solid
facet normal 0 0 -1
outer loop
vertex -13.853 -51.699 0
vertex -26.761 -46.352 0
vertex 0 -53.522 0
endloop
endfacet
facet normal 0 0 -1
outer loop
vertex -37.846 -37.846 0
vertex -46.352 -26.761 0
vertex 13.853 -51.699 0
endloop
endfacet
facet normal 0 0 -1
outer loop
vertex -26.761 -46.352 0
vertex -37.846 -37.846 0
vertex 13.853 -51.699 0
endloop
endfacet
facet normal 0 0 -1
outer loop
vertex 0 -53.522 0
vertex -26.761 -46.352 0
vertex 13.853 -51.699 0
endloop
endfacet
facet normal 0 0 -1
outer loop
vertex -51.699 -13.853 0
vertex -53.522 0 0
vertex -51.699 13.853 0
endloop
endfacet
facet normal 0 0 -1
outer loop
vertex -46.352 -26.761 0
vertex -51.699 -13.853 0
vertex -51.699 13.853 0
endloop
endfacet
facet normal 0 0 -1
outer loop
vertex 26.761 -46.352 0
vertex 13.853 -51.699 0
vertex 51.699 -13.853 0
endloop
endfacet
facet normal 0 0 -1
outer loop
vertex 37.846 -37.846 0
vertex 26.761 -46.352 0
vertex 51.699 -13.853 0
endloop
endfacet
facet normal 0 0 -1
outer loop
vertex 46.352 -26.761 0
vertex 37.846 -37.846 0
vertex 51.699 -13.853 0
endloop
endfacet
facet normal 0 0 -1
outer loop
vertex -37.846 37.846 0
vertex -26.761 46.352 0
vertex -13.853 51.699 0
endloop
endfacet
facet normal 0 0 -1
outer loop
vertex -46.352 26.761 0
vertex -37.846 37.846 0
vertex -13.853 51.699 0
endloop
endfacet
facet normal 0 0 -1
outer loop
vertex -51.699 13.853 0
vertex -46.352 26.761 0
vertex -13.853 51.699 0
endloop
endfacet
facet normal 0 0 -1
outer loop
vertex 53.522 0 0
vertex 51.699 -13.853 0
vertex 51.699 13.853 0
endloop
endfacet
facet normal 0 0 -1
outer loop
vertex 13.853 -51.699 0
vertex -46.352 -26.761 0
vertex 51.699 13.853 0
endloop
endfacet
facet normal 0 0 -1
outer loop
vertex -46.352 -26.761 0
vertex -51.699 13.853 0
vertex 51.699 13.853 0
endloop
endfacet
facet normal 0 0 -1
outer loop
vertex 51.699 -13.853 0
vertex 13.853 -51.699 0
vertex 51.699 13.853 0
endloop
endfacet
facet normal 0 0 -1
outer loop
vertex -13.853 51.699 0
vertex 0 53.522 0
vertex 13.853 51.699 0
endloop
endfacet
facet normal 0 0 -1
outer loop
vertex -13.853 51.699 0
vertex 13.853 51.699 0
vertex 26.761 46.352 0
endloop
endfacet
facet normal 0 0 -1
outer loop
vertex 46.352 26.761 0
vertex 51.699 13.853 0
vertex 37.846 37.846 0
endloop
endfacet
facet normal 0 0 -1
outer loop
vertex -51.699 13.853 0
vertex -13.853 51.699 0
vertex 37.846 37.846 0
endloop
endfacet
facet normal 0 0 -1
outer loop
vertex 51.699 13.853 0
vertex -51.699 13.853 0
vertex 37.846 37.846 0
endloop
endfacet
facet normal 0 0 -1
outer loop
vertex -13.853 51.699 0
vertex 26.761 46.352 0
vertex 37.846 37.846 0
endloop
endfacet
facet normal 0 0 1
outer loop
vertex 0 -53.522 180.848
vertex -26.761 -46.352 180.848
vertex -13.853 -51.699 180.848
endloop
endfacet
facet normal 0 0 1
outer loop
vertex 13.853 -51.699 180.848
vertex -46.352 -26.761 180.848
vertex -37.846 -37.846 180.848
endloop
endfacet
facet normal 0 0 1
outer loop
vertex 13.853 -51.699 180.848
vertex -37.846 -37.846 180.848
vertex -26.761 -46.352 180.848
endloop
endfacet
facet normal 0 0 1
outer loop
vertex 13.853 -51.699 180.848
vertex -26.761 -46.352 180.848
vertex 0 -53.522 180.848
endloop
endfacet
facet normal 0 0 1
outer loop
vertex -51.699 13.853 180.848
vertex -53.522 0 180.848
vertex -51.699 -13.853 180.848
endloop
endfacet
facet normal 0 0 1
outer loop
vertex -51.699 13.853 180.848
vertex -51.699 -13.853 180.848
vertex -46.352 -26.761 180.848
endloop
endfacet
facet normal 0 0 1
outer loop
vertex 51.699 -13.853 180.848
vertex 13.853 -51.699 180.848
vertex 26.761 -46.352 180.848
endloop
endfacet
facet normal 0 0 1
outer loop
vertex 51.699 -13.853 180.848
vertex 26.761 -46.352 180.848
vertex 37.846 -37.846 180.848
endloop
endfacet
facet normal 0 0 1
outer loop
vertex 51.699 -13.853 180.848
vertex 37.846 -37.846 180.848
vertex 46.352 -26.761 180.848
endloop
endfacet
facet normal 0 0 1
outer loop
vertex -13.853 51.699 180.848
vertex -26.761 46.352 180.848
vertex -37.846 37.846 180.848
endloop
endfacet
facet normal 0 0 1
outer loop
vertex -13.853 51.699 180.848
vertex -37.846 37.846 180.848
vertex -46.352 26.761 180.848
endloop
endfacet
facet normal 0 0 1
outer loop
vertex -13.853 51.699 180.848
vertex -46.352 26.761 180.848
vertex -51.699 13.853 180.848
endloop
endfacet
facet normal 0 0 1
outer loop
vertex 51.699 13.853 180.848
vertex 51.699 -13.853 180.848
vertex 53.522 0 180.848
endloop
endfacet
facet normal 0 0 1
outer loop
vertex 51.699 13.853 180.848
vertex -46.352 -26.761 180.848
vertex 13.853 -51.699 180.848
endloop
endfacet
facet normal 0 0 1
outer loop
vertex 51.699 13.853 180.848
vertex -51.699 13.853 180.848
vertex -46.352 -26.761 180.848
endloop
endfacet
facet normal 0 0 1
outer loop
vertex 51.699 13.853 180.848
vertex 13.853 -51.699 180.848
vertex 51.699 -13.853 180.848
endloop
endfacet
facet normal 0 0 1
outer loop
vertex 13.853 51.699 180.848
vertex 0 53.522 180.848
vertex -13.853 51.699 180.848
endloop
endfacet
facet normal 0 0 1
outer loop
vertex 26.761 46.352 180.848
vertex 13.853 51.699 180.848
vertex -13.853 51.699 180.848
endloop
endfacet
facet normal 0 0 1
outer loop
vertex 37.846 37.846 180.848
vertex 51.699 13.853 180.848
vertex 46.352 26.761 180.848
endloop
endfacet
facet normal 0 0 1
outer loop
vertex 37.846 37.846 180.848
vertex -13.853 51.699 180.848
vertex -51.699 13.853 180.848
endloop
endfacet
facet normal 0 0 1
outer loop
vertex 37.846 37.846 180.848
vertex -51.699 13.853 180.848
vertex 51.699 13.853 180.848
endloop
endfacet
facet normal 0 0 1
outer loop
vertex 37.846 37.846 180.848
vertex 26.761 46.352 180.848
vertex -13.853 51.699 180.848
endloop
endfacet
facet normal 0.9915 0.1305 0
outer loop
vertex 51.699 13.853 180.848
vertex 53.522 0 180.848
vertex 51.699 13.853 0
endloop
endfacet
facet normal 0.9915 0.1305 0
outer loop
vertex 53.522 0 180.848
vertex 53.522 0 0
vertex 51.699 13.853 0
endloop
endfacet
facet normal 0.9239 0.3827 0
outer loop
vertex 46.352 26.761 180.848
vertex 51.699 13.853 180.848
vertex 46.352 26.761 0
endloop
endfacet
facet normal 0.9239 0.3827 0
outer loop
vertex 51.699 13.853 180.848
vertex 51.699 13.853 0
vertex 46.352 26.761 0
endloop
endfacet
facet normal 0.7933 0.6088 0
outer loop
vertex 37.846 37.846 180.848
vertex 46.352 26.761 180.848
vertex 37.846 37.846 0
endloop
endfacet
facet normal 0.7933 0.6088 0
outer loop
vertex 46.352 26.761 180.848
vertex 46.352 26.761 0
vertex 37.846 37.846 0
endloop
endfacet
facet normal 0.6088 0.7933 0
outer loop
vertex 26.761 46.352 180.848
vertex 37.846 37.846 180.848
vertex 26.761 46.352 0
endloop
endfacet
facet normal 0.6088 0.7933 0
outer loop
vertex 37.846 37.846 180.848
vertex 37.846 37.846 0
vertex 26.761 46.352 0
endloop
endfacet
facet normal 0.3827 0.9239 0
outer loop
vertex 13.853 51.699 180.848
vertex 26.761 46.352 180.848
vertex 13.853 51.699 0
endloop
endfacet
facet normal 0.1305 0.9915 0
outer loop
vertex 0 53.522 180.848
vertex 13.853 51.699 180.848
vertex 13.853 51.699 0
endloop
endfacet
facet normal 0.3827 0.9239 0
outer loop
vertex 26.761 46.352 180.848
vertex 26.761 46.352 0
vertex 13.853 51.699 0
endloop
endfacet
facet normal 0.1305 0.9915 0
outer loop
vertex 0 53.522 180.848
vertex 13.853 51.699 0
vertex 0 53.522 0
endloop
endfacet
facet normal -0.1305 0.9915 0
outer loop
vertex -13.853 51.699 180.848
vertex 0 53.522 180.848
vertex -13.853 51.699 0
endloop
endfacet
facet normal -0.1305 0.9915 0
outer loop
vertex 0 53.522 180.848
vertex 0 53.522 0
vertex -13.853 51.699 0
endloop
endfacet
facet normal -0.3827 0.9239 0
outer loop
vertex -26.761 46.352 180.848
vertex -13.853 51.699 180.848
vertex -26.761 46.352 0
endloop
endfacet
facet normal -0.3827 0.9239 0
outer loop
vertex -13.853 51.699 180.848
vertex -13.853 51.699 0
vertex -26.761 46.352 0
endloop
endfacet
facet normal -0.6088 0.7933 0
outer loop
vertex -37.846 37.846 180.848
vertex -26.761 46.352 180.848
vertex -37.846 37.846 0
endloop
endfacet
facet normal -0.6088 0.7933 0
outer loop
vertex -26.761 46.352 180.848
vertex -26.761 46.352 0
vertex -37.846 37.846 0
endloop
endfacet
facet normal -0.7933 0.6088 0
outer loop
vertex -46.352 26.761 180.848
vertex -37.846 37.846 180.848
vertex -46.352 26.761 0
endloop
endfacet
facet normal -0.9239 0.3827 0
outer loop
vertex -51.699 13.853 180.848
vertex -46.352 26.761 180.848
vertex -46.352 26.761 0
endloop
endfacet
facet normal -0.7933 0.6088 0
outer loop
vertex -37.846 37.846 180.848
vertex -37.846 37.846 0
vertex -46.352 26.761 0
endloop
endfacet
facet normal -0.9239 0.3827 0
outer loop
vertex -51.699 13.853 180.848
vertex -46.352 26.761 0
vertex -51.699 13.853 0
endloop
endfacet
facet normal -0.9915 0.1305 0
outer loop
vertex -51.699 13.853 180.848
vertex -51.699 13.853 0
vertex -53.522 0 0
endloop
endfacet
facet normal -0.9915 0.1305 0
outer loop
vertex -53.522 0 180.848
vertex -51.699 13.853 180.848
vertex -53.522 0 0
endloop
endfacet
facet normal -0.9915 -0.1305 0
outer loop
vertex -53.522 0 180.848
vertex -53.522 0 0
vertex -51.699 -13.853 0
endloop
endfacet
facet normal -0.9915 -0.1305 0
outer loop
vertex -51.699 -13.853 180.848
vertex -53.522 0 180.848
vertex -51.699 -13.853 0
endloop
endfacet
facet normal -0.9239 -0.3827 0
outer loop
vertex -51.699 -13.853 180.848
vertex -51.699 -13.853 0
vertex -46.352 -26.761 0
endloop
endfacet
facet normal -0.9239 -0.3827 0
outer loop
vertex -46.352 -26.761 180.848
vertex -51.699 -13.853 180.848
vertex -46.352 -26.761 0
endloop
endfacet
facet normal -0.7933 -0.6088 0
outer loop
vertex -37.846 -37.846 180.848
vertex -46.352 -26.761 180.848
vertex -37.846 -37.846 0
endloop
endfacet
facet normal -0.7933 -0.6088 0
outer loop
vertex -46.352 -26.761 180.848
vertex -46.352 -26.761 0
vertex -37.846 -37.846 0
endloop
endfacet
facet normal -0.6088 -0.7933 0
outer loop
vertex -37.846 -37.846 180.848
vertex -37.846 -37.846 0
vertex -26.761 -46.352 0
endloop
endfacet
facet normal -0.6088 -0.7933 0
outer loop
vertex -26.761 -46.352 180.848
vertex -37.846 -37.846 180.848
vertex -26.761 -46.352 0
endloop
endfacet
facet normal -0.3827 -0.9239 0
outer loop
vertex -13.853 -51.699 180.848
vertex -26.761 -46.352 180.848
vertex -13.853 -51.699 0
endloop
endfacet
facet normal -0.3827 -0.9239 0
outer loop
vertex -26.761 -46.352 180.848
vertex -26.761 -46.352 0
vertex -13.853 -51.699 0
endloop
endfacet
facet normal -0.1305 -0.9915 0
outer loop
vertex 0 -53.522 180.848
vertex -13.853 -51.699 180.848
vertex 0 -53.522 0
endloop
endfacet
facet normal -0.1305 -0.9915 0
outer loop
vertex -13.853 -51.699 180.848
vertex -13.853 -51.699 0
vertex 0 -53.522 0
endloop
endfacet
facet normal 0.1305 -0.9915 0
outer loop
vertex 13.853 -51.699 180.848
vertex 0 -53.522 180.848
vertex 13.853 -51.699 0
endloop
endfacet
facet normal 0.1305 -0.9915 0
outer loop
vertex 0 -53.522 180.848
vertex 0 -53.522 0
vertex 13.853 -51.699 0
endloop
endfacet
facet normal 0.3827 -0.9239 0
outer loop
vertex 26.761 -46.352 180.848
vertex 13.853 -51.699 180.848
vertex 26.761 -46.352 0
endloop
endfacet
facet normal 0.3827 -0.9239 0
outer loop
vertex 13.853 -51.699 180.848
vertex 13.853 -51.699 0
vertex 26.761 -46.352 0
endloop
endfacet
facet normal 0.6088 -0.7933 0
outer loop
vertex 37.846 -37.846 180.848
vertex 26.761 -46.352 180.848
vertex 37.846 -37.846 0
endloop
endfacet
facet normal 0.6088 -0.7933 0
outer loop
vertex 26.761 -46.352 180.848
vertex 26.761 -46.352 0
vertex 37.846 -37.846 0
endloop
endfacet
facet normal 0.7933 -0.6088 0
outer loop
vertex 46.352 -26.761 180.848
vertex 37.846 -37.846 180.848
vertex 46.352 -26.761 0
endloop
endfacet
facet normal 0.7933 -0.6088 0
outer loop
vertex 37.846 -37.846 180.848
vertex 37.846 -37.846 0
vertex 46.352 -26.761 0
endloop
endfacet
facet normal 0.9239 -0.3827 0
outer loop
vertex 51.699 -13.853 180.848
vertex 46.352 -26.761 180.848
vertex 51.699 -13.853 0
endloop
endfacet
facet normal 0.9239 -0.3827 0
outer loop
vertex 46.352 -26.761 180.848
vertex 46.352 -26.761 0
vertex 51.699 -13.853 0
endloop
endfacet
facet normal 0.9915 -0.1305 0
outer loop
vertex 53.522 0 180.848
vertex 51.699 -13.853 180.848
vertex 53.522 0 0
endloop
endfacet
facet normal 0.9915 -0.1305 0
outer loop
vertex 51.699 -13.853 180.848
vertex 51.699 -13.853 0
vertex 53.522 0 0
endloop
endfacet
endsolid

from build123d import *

# Parameters (mm, degrees)
F0_R     = 53.5223969486
F1_DEPTH = 113.03
F2_DEPTH = 42.418
F3_R     = 36.0053843075
F4_DEPTH = 25.4
F5_DEPTH = 25.4


with BuildPart() as f1:
    # F0 (on Top) → F1 (new body)
    with BuildSketch(Plane.XY):
        Circle(F0_R)
    extrude(amount=F1_DEPTH)

    # F2 (add): a face of the model
    f2_faces = [f1.faces().sort_by_distance(p)[0] for p in [
        (0, 0, 113.03),
    ]]
    extrude(f2_faces, amount=F2_DEPTH)

    # F3 (on face) → F4 (join)
    with BuildSketch(Plane.XY.offset(155.448)):
        Circle(F3_R)
    extrude(amount=F4_DEPTH)

    # F5 (add): a face of the model
    f5_faces = [f1.faces().sort_by_distance(p)[0] for p in [
        (-52.0085549555, 0, 155.448),
    ]]
    extrude(f5_faces, amount=F5_DEPTH)


solid = f1.part
